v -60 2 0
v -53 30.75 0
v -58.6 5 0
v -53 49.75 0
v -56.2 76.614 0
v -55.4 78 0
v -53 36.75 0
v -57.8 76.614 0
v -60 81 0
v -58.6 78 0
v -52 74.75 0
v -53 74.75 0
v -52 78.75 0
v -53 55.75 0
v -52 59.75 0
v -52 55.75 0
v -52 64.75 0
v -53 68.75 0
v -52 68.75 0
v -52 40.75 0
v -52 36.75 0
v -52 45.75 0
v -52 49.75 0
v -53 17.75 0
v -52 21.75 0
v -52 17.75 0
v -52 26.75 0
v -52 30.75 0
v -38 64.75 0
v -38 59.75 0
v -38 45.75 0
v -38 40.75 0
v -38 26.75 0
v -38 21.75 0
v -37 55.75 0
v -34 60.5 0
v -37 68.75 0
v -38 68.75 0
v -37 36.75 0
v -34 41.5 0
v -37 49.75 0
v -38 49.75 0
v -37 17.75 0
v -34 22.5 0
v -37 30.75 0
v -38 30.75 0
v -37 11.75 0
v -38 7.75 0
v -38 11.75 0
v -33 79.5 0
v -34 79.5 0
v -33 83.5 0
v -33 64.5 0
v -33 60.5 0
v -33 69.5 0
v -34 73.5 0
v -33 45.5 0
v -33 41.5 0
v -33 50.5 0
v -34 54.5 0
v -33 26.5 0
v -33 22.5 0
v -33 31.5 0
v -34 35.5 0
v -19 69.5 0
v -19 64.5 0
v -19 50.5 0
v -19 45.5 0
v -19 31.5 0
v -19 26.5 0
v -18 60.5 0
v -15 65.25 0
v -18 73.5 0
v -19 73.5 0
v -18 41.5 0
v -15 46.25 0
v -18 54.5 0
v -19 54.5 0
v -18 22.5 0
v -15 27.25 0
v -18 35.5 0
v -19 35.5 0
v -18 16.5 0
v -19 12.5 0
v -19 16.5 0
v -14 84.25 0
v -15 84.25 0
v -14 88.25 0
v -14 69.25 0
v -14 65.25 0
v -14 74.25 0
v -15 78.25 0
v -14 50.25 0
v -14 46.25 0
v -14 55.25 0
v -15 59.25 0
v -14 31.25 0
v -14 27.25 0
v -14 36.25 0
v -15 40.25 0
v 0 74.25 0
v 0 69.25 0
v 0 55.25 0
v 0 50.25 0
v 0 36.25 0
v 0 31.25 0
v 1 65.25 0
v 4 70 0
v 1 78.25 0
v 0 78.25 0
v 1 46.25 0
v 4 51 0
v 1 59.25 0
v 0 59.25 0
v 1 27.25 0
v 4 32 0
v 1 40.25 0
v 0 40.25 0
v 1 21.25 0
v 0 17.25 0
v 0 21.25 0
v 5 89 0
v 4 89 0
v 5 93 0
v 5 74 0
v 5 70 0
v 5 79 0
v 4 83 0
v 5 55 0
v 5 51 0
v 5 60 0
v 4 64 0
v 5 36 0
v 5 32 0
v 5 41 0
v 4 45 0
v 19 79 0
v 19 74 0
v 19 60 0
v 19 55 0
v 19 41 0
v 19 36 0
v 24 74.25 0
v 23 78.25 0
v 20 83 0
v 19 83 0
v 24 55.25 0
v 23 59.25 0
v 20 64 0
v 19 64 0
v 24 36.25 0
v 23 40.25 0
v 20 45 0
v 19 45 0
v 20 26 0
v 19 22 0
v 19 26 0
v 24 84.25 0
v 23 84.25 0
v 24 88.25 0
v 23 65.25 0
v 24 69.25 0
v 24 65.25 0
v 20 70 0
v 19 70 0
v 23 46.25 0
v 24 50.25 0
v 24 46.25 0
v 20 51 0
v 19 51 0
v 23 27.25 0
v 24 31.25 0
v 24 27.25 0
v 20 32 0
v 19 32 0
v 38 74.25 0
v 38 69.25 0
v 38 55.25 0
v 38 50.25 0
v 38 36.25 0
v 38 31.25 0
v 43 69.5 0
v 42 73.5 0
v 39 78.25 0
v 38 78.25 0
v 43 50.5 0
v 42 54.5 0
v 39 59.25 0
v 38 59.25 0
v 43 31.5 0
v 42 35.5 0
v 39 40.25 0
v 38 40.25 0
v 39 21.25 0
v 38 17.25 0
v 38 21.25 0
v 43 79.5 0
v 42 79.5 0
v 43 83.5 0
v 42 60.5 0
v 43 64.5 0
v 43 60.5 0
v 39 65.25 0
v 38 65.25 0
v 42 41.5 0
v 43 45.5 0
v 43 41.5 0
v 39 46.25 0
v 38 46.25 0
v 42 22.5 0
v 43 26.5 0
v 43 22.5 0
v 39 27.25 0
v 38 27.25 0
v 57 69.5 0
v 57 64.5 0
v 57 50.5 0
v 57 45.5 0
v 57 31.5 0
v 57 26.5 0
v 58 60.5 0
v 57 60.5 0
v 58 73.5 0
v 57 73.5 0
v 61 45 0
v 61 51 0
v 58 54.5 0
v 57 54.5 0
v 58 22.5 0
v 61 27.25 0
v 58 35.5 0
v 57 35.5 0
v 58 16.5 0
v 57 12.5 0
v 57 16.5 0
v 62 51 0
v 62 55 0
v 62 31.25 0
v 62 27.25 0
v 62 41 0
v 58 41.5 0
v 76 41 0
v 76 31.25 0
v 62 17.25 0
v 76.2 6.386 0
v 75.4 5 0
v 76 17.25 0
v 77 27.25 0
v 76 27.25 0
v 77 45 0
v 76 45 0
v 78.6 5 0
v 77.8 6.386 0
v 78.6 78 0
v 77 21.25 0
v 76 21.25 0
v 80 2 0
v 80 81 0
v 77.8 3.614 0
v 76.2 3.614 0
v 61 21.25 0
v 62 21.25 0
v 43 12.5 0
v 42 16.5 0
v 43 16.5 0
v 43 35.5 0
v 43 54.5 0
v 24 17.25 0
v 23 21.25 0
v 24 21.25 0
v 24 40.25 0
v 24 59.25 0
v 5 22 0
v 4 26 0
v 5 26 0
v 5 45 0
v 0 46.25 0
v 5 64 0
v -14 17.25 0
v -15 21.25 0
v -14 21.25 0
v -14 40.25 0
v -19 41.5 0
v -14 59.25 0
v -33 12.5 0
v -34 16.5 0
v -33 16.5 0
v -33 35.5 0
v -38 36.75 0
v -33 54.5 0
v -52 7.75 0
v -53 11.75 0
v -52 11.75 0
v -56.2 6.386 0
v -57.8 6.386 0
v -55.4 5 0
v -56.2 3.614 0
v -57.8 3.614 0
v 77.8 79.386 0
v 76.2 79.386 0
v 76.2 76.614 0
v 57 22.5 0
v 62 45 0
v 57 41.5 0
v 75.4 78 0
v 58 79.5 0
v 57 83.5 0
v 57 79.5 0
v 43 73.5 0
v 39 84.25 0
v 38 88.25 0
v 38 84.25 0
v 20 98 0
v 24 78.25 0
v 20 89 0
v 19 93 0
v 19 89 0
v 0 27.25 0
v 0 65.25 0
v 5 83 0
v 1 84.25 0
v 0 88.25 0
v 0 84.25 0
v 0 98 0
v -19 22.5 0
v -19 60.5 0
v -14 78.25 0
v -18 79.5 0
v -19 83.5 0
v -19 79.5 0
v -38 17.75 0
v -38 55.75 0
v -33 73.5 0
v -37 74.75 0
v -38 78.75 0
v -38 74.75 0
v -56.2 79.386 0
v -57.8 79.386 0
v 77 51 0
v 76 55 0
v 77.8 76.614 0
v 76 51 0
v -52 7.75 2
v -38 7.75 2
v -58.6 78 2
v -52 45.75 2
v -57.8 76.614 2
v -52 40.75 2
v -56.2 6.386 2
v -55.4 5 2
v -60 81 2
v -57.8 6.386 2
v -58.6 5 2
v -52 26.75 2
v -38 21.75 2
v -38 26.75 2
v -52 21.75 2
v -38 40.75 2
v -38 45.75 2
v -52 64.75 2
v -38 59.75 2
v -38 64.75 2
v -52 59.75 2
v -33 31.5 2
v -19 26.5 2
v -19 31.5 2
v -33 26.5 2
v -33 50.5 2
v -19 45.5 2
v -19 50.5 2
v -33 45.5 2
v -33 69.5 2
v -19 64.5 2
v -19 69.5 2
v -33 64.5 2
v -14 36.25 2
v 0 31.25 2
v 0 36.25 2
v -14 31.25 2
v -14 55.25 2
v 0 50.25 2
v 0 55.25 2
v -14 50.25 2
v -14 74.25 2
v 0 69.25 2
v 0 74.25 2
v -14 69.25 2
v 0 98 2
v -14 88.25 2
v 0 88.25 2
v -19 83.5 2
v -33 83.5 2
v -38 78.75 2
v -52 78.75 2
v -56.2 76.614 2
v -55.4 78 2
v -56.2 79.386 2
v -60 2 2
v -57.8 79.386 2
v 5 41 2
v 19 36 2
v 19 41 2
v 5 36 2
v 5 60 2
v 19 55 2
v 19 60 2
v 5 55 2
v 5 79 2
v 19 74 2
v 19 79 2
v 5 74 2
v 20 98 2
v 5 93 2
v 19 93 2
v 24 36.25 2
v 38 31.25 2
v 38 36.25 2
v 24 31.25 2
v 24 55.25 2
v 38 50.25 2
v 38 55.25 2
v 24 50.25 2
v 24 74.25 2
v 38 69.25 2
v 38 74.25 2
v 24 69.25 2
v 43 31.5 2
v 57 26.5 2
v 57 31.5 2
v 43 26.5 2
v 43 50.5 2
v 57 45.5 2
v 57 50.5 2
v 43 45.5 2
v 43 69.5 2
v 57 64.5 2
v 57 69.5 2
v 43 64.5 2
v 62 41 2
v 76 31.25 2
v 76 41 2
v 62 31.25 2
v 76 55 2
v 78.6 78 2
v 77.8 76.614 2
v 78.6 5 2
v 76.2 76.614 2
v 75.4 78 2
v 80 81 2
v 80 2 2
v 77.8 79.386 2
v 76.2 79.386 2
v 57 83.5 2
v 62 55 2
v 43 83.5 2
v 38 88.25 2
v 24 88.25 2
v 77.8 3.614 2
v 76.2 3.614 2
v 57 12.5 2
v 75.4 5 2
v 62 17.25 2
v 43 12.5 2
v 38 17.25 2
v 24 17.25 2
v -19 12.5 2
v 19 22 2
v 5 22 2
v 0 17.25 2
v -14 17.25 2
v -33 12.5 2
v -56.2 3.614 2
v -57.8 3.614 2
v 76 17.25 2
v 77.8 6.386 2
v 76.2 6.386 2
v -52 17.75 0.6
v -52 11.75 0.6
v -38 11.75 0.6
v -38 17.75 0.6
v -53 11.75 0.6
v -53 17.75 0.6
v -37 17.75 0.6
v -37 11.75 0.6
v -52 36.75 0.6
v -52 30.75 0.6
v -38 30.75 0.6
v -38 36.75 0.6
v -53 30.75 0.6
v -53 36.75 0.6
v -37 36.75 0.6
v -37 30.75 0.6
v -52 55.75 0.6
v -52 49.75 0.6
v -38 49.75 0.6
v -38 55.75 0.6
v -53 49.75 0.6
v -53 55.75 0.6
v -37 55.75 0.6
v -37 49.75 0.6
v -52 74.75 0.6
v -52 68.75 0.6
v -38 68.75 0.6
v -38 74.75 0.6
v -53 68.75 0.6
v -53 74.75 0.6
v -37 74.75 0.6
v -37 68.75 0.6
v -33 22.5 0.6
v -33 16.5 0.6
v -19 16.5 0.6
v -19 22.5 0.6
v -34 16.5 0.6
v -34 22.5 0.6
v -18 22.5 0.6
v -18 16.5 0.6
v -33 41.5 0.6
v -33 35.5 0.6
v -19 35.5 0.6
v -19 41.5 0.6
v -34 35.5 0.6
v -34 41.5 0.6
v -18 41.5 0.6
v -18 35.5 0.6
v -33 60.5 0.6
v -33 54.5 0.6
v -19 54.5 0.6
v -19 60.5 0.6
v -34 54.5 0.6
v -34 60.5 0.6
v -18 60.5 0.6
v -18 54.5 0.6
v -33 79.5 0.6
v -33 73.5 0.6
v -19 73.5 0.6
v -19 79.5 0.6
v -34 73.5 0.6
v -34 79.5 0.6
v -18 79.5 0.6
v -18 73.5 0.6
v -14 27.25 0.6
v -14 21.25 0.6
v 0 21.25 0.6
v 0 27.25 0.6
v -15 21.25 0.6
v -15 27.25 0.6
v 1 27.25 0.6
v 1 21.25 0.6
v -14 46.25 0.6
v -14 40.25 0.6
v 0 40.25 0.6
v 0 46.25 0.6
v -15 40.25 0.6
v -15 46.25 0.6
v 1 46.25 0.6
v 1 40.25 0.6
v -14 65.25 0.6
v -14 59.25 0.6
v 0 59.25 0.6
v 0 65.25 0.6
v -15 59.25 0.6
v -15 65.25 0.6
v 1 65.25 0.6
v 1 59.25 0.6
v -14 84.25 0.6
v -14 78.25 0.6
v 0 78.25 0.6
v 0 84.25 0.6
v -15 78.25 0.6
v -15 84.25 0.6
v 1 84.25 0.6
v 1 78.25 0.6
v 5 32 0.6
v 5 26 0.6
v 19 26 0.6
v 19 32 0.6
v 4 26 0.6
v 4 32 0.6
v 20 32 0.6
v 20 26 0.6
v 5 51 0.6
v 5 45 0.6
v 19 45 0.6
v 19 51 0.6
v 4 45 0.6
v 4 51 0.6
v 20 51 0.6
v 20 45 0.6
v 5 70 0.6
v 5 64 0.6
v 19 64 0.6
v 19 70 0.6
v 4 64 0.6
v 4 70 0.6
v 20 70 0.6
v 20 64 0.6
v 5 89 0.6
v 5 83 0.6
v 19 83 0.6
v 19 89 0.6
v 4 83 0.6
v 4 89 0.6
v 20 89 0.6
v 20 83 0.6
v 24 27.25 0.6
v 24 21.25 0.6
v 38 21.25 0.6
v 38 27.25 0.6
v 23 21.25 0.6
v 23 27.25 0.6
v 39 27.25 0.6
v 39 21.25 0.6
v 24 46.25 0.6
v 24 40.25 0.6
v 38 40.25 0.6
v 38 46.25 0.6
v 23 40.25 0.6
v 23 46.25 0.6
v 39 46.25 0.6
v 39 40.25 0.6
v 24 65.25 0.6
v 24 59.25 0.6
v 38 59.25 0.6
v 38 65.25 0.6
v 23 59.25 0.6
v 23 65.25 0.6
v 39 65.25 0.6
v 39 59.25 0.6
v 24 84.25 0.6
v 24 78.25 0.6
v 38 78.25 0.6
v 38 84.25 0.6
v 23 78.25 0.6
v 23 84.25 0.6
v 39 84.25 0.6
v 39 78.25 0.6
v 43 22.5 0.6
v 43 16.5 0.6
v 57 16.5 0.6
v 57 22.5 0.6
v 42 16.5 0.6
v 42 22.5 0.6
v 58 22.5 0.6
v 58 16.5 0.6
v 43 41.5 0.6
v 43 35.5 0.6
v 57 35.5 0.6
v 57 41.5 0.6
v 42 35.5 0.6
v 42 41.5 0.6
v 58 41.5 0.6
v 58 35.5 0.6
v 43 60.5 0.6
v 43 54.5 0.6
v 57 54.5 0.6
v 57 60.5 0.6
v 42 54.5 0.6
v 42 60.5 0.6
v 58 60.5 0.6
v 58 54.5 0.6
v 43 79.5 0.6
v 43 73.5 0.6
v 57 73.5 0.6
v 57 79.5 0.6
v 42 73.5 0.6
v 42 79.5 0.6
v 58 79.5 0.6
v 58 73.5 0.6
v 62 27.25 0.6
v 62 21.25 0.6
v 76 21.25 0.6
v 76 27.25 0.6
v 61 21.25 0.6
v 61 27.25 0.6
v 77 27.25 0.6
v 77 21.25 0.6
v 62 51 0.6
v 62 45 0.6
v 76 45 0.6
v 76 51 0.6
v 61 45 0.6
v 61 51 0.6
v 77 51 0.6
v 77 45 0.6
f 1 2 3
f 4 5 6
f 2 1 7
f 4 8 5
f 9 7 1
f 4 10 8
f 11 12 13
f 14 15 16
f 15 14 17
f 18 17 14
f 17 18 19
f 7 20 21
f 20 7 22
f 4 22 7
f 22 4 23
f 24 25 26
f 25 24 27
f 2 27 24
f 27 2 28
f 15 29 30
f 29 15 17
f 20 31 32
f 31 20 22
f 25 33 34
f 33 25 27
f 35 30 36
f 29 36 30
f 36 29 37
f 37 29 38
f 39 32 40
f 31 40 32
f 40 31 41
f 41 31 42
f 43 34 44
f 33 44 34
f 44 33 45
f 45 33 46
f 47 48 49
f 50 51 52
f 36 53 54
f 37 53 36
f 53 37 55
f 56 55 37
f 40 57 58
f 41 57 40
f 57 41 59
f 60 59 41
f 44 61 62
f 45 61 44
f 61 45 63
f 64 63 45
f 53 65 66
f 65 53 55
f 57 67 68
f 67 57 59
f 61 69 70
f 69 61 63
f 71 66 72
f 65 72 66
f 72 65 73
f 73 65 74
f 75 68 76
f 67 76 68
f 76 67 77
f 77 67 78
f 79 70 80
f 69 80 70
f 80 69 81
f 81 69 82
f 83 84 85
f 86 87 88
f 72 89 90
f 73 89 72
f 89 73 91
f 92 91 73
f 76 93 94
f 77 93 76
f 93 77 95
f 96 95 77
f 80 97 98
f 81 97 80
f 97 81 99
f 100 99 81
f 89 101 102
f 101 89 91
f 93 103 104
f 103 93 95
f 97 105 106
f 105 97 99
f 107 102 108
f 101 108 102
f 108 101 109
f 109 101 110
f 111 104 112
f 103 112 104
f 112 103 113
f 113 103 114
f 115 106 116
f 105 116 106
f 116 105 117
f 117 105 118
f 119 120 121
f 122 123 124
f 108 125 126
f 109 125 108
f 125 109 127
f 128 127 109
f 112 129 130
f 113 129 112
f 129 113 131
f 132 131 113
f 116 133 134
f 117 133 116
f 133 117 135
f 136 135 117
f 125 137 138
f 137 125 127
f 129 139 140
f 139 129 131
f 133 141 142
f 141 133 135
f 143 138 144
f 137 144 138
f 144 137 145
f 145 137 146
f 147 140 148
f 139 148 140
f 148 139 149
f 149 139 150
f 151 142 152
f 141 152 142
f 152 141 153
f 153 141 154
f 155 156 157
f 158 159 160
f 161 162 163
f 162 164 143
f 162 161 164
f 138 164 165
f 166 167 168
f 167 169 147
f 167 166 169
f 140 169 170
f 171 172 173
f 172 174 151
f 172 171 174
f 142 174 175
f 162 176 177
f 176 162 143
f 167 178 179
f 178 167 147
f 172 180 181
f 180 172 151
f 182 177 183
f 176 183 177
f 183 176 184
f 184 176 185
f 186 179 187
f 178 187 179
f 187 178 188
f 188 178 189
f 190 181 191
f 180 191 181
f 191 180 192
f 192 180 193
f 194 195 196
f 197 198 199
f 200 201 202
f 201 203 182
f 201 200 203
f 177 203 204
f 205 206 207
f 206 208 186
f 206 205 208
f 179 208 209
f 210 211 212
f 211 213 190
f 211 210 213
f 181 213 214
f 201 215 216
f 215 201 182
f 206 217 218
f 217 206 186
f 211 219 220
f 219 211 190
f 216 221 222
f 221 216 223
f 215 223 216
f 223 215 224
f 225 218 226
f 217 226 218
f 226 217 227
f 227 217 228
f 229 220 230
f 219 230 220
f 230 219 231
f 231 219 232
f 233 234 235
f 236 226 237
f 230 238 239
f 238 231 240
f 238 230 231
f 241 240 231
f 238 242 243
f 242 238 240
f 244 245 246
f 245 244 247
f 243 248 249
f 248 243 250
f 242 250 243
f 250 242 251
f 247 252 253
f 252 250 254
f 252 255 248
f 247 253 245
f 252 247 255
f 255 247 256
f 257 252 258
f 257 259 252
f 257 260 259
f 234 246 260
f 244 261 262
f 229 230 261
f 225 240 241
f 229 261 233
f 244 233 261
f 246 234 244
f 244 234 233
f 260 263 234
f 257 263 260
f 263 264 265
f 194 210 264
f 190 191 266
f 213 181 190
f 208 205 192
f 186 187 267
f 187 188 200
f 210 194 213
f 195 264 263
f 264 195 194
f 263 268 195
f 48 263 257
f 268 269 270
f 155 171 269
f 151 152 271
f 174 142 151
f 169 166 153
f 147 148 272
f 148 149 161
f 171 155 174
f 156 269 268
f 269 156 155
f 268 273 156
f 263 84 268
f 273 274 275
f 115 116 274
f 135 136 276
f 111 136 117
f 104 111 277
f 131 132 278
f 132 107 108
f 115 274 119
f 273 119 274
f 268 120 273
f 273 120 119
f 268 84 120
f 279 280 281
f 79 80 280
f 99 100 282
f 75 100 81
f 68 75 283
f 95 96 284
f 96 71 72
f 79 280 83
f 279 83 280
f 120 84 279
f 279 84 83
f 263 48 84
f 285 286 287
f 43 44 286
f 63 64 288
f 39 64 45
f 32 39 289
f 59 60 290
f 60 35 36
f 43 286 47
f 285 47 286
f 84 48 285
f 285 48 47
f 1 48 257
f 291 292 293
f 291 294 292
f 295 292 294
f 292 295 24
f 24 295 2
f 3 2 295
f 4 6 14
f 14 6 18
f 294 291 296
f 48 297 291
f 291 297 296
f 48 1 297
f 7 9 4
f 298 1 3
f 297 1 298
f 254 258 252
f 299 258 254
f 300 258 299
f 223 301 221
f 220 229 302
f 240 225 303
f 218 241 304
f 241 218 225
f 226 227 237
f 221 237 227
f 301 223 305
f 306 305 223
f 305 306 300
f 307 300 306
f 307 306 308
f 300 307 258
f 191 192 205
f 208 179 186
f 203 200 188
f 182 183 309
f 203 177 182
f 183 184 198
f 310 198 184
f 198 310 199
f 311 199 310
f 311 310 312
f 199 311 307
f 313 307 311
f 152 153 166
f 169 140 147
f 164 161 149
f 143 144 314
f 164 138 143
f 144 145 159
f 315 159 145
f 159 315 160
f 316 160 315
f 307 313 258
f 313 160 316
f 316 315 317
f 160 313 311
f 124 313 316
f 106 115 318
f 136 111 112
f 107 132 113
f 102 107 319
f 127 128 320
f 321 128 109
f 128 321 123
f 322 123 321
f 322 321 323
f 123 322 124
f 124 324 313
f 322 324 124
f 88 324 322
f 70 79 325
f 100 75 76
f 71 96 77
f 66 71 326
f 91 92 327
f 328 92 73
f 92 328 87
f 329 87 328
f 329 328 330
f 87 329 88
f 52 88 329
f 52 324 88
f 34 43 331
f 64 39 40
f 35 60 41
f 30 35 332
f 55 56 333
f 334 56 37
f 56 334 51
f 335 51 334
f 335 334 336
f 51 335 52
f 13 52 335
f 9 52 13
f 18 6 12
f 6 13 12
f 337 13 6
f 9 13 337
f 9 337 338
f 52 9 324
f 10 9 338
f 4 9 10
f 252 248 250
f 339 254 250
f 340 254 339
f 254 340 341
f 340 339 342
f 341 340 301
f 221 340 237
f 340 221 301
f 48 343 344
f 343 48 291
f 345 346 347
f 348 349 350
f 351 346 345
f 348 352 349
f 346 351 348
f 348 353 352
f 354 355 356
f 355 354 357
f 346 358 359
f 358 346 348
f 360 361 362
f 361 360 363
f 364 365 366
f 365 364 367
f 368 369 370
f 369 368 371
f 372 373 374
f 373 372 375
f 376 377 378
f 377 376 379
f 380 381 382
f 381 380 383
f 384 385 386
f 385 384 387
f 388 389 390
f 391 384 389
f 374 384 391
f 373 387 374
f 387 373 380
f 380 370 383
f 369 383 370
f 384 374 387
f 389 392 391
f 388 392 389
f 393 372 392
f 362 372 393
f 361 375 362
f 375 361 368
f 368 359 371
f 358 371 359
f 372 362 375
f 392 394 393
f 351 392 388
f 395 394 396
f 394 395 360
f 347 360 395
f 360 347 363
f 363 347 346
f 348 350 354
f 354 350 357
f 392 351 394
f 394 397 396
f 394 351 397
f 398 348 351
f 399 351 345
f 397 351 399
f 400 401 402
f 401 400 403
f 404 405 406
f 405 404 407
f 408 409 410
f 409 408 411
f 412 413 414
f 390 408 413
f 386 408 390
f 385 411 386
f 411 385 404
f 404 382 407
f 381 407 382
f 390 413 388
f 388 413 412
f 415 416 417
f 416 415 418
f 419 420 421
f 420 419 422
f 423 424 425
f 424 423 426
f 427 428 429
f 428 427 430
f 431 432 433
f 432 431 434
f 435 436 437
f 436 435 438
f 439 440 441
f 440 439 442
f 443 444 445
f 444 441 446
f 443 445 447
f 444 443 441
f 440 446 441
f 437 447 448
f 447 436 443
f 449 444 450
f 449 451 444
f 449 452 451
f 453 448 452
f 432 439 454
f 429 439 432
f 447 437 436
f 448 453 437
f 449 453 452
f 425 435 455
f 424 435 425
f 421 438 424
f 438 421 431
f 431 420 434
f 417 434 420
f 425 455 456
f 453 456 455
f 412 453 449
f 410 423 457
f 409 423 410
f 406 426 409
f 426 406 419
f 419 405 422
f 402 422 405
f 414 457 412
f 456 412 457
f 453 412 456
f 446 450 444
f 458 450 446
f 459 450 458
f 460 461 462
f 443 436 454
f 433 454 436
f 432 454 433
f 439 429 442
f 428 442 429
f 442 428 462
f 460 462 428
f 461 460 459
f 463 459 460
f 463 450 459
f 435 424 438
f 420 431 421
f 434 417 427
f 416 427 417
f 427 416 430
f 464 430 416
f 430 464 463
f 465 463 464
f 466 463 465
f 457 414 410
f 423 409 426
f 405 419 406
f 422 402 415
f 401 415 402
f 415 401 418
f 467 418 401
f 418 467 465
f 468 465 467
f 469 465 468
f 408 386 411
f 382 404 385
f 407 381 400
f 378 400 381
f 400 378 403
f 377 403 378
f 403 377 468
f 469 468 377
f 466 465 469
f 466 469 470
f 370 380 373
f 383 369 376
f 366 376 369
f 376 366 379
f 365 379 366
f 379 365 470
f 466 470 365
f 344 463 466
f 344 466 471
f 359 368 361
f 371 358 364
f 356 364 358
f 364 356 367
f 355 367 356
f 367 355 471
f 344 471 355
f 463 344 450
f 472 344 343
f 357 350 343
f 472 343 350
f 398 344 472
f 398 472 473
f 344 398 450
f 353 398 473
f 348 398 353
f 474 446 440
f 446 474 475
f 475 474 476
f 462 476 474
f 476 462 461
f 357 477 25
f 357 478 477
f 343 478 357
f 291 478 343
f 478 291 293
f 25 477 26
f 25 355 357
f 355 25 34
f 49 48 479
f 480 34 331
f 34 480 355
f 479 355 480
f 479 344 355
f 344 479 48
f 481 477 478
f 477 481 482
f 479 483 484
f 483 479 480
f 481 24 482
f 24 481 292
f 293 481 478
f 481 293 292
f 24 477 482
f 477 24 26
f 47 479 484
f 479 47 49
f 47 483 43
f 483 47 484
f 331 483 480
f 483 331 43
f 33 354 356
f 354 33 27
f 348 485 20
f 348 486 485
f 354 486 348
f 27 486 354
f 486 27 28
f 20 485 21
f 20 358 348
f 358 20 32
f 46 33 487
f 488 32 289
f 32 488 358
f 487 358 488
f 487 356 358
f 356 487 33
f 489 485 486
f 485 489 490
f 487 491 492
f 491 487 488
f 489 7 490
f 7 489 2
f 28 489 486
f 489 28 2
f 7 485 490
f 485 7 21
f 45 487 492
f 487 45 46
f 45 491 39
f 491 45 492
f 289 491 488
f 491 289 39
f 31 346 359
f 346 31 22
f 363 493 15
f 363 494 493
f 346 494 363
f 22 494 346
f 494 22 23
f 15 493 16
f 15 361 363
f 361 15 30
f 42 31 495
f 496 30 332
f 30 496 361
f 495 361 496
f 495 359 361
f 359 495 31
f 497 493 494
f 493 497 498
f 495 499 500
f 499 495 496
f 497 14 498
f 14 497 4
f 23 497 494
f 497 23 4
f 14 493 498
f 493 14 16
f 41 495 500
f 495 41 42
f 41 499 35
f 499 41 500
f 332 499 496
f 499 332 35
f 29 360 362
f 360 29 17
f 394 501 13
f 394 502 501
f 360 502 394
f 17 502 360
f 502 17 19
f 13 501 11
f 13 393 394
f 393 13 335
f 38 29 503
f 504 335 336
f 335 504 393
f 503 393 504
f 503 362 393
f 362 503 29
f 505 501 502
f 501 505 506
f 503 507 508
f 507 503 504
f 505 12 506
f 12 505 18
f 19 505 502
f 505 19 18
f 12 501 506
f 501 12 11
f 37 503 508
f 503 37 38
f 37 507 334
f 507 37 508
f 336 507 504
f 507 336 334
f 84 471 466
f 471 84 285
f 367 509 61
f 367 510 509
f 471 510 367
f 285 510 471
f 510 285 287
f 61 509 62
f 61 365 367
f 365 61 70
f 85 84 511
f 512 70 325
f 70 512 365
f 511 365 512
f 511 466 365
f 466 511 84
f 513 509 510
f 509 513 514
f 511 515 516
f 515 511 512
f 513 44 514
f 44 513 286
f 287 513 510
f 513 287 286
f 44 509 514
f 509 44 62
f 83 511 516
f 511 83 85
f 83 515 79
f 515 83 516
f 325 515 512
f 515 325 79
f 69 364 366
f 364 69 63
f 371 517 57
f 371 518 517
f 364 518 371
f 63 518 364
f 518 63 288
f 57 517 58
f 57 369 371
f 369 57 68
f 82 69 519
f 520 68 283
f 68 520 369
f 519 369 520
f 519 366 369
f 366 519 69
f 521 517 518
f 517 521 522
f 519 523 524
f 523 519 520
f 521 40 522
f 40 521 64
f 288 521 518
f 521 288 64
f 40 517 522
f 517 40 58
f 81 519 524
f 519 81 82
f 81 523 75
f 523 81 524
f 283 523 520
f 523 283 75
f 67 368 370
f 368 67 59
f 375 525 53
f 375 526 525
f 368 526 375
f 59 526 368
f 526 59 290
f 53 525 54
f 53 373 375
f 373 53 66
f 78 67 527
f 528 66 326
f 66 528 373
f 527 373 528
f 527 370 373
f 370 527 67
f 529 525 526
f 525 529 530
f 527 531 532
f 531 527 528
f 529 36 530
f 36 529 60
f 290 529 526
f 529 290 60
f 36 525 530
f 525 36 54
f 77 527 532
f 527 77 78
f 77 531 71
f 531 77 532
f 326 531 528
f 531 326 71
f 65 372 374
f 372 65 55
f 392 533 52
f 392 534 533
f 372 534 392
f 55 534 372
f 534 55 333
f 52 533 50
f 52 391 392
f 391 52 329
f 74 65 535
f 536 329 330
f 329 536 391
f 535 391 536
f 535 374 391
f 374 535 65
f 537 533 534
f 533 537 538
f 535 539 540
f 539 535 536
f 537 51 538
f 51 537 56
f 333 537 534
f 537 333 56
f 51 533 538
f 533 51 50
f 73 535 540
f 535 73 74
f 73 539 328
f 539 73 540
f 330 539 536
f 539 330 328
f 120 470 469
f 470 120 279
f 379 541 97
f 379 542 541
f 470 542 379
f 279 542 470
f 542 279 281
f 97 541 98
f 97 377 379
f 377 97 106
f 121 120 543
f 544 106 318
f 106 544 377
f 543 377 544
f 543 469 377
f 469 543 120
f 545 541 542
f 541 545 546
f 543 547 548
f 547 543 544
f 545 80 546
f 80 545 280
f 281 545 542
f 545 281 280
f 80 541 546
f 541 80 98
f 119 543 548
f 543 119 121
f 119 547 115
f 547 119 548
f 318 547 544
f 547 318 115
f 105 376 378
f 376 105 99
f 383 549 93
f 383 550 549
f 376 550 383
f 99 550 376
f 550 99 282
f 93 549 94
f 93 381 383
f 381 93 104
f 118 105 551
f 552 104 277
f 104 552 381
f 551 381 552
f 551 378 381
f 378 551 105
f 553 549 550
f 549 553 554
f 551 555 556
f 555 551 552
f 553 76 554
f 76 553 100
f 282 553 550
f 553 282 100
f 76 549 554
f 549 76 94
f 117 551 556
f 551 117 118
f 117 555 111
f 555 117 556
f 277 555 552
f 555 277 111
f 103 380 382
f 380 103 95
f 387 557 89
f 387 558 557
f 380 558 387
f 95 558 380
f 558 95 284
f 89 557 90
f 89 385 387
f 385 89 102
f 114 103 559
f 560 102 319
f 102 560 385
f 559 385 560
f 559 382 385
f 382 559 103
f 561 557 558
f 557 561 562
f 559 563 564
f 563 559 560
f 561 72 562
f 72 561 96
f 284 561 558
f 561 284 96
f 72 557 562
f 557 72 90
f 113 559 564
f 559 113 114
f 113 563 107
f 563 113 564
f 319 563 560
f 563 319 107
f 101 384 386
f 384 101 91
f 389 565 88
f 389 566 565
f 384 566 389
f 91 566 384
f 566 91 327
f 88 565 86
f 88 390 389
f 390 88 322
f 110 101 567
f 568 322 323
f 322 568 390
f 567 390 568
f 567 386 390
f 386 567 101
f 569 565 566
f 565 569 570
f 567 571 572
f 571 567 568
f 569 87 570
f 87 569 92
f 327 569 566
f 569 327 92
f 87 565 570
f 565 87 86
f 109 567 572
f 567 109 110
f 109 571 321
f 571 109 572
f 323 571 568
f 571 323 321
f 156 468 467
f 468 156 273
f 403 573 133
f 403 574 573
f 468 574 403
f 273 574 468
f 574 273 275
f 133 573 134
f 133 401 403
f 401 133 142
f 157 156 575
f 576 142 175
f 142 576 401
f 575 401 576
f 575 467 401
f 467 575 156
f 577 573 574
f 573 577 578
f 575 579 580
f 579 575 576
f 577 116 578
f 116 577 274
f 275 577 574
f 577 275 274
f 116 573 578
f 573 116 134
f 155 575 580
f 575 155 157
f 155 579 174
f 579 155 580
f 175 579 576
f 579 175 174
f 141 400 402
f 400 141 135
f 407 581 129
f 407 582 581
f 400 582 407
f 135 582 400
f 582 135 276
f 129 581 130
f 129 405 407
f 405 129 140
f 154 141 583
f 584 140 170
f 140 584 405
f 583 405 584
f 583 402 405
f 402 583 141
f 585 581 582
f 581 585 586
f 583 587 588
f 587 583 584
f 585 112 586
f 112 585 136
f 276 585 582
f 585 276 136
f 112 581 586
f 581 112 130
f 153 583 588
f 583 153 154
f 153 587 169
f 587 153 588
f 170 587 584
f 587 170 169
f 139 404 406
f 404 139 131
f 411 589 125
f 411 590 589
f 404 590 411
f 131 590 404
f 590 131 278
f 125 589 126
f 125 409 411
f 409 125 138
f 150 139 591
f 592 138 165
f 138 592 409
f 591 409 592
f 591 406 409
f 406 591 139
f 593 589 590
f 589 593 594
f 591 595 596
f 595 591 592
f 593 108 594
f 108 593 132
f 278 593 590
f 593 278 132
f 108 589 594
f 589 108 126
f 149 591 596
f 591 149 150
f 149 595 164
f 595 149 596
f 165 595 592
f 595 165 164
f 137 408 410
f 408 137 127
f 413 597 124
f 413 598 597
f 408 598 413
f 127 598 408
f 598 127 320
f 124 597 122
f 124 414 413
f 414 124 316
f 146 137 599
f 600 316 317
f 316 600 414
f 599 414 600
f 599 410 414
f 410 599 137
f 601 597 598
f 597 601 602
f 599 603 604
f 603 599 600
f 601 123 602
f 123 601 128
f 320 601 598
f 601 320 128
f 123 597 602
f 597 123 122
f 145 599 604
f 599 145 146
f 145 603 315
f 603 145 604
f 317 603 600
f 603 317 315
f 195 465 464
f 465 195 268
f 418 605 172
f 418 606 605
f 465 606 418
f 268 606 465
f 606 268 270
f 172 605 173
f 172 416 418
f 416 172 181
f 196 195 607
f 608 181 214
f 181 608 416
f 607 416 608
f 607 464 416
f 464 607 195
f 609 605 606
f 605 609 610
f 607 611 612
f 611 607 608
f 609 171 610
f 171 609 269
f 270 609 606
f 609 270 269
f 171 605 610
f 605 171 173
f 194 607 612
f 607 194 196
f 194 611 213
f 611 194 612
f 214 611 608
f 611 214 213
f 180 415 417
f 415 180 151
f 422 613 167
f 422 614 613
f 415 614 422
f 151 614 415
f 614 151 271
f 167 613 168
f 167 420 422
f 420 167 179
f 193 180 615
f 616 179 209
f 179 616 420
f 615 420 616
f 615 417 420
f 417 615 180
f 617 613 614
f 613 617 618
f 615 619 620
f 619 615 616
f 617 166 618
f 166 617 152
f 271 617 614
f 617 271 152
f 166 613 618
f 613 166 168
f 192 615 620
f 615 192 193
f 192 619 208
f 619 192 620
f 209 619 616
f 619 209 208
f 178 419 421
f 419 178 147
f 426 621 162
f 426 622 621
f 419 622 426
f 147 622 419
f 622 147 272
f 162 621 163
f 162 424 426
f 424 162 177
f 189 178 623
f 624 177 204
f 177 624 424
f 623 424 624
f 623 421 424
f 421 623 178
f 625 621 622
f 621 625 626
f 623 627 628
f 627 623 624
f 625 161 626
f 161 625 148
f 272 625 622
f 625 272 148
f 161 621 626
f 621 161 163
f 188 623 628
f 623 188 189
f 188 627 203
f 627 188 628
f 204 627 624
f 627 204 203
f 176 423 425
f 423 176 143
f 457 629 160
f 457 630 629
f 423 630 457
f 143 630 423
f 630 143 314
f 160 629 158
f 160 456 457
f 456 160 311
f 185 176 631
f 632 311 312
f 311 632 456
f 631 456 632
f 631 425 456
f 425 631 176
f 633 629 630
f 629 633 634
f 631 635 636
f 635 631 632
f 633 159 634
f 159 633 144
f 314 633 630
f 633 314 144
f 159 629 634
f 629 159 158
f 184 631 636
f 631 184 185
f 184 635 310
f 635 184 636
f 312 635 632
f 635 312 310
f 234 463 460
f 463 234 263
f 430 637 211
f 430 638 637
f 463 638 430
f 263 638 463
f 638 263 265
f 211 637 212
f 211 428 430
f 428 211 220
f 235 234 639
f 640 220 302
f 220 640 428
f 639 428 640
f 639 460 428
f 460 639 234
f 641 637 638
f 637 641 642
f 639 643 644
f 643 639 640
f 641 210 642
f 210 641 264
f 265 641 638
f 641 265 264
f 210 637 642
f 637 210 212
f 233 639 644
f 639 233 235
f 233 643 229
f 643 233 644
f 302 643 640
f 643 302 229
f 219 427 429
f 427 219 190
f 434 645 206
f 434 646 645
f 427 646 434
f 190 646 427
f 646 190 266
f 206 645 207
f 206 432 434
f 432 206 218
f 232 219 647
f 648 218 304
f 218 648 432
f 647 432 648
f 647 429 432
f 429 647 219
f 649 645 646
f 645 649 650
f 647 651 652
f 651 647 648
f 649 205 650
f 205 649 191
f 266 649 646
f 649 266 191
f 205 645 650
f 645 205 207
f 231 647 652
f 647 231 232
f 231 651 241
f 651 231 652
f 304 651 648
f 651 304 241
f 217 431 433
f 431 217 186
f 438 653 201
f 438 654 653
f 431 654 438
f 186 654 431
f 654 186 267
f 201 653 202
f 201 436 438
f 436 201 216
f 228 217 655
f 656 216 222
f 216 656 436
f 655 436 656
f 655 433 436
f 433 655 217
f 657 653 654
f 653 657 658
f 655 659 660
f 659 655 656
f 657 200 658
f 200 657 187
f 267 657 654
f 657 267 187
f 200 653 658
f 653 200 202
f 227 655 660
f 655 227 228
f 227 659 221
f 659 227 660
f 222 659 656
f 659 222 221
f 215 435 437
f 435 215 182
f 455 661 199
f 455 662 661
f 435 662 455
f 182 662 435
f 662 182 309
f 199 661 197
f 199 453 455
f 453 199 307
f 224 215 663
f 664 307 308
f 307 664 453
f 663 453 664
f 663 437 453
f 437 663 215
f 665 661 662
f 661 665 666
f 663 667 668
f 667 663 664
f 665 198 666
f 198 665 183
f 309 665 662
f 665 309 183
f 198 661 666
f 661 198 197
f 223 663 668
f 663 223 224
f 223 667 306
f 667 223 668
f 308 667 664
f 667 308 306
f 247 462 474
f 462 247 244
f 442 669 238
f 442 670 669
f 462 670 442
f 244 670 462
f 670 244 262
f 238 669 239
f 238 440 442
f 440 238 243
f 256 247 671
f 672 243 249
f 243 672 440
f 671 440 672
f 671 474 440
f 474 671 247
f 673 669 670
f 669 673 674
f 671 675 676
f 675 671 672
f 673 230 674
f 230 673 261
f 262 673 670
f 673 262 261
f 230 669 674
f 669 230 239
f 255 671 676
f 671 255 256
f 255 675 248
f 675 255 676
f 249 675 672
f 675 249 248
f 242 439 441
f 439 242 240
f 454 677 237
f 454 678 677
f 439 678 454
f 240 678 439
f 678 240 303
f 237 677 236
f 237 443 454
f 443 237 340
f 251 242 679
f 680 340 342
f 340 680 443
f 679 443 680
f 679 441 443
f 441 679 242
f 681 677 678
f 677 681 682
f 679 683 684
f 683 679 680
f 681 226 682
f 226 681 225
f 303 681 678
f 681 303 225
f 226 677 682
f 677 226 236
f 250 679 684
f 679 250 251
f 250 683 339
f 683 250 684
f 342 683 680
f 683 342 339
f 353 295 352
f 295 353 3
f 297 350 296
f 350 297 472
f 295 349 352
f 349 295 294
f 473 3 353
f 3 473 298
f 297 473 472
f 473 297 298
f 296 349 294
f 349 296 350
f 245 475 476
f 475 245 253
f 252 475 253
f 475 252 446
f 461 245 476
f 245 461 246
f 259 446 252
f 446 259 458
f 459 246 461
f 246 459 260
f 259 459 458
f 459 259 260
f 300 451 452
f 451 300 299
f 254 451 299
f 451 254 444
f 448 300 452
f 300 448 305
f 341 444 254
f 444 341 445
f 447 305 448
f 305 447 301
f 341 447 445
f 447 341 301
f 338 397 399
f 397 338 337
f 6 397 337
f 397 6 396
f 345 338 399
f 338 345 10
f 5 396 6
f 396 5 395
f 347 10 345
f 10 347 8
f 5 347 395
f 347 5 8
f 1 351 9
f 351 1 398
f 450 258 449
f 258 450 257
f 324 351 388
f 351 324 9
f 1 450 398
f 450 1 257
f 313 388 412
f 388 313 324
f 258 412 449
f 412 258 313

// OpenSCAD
// file: common.scad
module keyswitch_hole(x=0, y=0, a=0) {
    translate([x, y, 0]) {
        rotate([0, 0, 90+a]) {
            linear_extrude(height = 2) {
            square([14, 14], center = true);
            //translate([-8, 3, 0]) square([1, 3]);
            //translate([-8, -6, 0]) square([1, 3]);
            //translate([7, 3, 0]) square([1, 3]);
            //translate([7, -6, 0]) square([1, 3]);
            }
            linear_extrude(height = 0.6) {
                translate([-3, 7]) square([6, 1]);
            translate([-3, -8]) square([6, 1]);
            }
        }
    }
}

keyswitch_hole();

module joint_male_face() {
    translate([-1, 0])
    square([2,4]);
    translate([-3, 2])
    square([6,2]);
}

module joint_male(pos=[0,0]) {
    translate(pos){
      rotate([0,0,180]){
        linear_extrude(height=10)
        joint_male_face();
        
        translate([0,2,10])
        rotate([-90,0,0])
        linear_extrude(height=2)
        circle(3, $fn=12);
        
        translate([0,0,10])
        rotate([-90,0,0])
        linear_extrude(height=2)
        circle(1, $fn=12);
      }
    }
}

module joint_female(pos=[0,0]) {
    translate(pos){
      rotate([0,0,180]){
        linear_extrude(height=10)
        offset(delta=0.4)
        joint_male_face();
        
        translate([0,1.6,10])
        rotate([-90,0,0])
        linear_extrude(height=2.8)
        offset(delta=0.4)
        circle(3, $fn=12);

        translate([0,-0.4,10])
        rotate([-90,0,0])
        linear_extrude(height=2.8)
        offset(delta=0.4)
        circle(1, $fn=12);
      }
    }
}


joint_male([20, 0]);
joint_female([30, 0]);
// main file
use <common.scad>;

UNIT = 19;
UNIT_H = UNIT / 2;
UNIT_Q = UNIT / 4;
UNIT_E = UNIT / 8;

KEY_OFFSET_X = 12;
KEY_OFFSET_Y = 10;

finger_plate_points = [
    [-60,2],
    [80, 2],
    [80, 5+UNIT*4],
    [20, 22+UNIT*4],
    [0,  22+UNIT*4],
    [-60, 5+UNIT*4],
];

finger_plate_sc_points = [
    [-60+3, 2+3],
    [80-3, 2+3],
    [80-3, 5+UNIT*4 - 3],
    [-60+3, 5+UNIT*4 - 3],
];

module finger_plate_nohole() {
    linear_extrude(height = 2)
    polygon(points=finger_plate_points);
}

module keyswitch_col(x=0,y=0,c=3,a=0) {
    rotate([0, 0, a])
    for (i = [0:c-1]) {
        keyswitch_hole(x, y+19*i);
    }
}

module finger_plate_holes() {
    // G
    GX = KEY_OFFSET_X - UNIT * 3;
    GY = KEY_OFFSET_Y + UNIT_Q;
    echo("G: ", GX, GY);
    keyswitch_col(GX, GY, 4);
    // F
    FX = KEY_OFFSET_X- UNIT * 2;
    FY = KEY_OFFSET_Y + UNIT_H;
    echo("F: ", FX, FY);
    keyswitch_col(FX, FY, 4);
    // E
    EX = KEY_OFFSET_X - UNIT;
    EY = KEY_OFFSET_Y + UNIT_H + UNIT_Q;
    echo("E: ", EX, EY);
    keyswitch_col(EX, EY, 4);
    // D
    DX = KEY_OFFSET_X;
    DY = KEY_OFFSET_Y + UNIT;
    echo("D: ", DX, DY);
    keyswitch_col(DX, DY, 4);
    // C
    CX = KEY_OFFSET_X+ UNIT;
    CY = KEY_OFFSET_Y + UNIT_H + UNIT_Q;
    echo("C: ", CX, CY);
    keyswitch_col(CX, CY, 4);
    // B
    BX = KEY_OFFSET_X+UNIT * 2;
    BY = KEY_OFFSET_Y+ UNIT_H;
    echo("B: ", BX, BY);
    keyswitch_col(BX, BY, 4);
    // A
    AX = KEY_OFFSET_X+UNIT*3;
    AY = KEY_OFFSET_Y+UNIT_H+UNIT_Q;
    echo("A: ", AX, AY);
    keyswitch_col(AX, AY, 1);
    echo("A2: ", AX, AY + UNIT + UNIT_Q);
    keyswitch_col(AX, AY + UNIT + UNIT_Q, 1);  
    for(p=finger_plate_sc_points){
        linear_extrude(height=5)
            translate(p)
            circle(1.6);
    }
}

module finger_plate() {
    difference() {
        finger_plate_nohole();
        finger_plate_holes();
    }
}


tilt_angle = [-6,-8,0];
tilt_angle_r = tilt_angle * -1;
echo(tilt_angle_r);

height = 26;

module finger_case_outer_face() {
    projection()
        translate([0,0,height])
        rotate(tilt_angle)
        linear_extrude(height=2)
        offset(2)
        polygon(points=finger_plate_points);
}

module finger_case_inner_face() {
    projection()
        translate([0,0,height])
        rotate(tilt_angle)
        linear_extrude(height=2)
        offset(-2)
        polygon(points=finger_plate_points);
}

module finger_case_bottom_face() {
    difference() {
        finger_case_outer_face();
        finger_case_inner_face();
    }
    projection()
    translate([0,0,height])
    rotate(tilt_angle)
    for(p=finger_plate_sc_points){
        linear_extrude(height=1)
        translate(p)
        circle(4);
    }
}


module finger_case_nohole() {
    difference() {
        linear_extrude(height=50)
        finger_case_bottom_face();
    
        translate([0,0,height])
        rotate(tilt_angle){
            linear_extrude(height=50)
            square(200, center=true);
            // sc hole
            translate([0,0,-9])
            linear_extrude(height=9)
            for(p=finger_plate_sc_points){
                translate(p)
                circle(1.6);
            }
            // plate_hole
            translate([0,0,-2])
            linear_extrude(height=2)
            offset(0.2)
            polygon(points=finger_plate_points);
        }
    }
}

module finger_case_hole() {
    // cable hole
    translate([50,6,0])
    rotate([90,0,0])
    linear_extrude(height=10) {
        translate([0, 10])
        circle(5);
        translate([-5,10])
        square([10, 30]);
    }
    // USB hole
    translate([11,104,0])
    rotate([90,0,0])
    linear_extrude(height=10) {
        translate([0, 10])
        circle(6);
        translate([-6, 10])
        square([12, 30]);        
    }
    // TRRS hole
    translate([61,90,0])
    rotate([90,0,0])
    linear_extrude(height=10) {
        translate([0, 15])
        circle(5);
        translate([-5, 15])
        square([10, 30]);        
    }
    for (x = [0, 70]) {
        joint_female(x);
    }
}

module finger_case() {
    difference() {
        finger_case_nohole();
        finger_case_hole();
    }
}

//finger_case();

//rotate([180,0,0])
finger_plate();
